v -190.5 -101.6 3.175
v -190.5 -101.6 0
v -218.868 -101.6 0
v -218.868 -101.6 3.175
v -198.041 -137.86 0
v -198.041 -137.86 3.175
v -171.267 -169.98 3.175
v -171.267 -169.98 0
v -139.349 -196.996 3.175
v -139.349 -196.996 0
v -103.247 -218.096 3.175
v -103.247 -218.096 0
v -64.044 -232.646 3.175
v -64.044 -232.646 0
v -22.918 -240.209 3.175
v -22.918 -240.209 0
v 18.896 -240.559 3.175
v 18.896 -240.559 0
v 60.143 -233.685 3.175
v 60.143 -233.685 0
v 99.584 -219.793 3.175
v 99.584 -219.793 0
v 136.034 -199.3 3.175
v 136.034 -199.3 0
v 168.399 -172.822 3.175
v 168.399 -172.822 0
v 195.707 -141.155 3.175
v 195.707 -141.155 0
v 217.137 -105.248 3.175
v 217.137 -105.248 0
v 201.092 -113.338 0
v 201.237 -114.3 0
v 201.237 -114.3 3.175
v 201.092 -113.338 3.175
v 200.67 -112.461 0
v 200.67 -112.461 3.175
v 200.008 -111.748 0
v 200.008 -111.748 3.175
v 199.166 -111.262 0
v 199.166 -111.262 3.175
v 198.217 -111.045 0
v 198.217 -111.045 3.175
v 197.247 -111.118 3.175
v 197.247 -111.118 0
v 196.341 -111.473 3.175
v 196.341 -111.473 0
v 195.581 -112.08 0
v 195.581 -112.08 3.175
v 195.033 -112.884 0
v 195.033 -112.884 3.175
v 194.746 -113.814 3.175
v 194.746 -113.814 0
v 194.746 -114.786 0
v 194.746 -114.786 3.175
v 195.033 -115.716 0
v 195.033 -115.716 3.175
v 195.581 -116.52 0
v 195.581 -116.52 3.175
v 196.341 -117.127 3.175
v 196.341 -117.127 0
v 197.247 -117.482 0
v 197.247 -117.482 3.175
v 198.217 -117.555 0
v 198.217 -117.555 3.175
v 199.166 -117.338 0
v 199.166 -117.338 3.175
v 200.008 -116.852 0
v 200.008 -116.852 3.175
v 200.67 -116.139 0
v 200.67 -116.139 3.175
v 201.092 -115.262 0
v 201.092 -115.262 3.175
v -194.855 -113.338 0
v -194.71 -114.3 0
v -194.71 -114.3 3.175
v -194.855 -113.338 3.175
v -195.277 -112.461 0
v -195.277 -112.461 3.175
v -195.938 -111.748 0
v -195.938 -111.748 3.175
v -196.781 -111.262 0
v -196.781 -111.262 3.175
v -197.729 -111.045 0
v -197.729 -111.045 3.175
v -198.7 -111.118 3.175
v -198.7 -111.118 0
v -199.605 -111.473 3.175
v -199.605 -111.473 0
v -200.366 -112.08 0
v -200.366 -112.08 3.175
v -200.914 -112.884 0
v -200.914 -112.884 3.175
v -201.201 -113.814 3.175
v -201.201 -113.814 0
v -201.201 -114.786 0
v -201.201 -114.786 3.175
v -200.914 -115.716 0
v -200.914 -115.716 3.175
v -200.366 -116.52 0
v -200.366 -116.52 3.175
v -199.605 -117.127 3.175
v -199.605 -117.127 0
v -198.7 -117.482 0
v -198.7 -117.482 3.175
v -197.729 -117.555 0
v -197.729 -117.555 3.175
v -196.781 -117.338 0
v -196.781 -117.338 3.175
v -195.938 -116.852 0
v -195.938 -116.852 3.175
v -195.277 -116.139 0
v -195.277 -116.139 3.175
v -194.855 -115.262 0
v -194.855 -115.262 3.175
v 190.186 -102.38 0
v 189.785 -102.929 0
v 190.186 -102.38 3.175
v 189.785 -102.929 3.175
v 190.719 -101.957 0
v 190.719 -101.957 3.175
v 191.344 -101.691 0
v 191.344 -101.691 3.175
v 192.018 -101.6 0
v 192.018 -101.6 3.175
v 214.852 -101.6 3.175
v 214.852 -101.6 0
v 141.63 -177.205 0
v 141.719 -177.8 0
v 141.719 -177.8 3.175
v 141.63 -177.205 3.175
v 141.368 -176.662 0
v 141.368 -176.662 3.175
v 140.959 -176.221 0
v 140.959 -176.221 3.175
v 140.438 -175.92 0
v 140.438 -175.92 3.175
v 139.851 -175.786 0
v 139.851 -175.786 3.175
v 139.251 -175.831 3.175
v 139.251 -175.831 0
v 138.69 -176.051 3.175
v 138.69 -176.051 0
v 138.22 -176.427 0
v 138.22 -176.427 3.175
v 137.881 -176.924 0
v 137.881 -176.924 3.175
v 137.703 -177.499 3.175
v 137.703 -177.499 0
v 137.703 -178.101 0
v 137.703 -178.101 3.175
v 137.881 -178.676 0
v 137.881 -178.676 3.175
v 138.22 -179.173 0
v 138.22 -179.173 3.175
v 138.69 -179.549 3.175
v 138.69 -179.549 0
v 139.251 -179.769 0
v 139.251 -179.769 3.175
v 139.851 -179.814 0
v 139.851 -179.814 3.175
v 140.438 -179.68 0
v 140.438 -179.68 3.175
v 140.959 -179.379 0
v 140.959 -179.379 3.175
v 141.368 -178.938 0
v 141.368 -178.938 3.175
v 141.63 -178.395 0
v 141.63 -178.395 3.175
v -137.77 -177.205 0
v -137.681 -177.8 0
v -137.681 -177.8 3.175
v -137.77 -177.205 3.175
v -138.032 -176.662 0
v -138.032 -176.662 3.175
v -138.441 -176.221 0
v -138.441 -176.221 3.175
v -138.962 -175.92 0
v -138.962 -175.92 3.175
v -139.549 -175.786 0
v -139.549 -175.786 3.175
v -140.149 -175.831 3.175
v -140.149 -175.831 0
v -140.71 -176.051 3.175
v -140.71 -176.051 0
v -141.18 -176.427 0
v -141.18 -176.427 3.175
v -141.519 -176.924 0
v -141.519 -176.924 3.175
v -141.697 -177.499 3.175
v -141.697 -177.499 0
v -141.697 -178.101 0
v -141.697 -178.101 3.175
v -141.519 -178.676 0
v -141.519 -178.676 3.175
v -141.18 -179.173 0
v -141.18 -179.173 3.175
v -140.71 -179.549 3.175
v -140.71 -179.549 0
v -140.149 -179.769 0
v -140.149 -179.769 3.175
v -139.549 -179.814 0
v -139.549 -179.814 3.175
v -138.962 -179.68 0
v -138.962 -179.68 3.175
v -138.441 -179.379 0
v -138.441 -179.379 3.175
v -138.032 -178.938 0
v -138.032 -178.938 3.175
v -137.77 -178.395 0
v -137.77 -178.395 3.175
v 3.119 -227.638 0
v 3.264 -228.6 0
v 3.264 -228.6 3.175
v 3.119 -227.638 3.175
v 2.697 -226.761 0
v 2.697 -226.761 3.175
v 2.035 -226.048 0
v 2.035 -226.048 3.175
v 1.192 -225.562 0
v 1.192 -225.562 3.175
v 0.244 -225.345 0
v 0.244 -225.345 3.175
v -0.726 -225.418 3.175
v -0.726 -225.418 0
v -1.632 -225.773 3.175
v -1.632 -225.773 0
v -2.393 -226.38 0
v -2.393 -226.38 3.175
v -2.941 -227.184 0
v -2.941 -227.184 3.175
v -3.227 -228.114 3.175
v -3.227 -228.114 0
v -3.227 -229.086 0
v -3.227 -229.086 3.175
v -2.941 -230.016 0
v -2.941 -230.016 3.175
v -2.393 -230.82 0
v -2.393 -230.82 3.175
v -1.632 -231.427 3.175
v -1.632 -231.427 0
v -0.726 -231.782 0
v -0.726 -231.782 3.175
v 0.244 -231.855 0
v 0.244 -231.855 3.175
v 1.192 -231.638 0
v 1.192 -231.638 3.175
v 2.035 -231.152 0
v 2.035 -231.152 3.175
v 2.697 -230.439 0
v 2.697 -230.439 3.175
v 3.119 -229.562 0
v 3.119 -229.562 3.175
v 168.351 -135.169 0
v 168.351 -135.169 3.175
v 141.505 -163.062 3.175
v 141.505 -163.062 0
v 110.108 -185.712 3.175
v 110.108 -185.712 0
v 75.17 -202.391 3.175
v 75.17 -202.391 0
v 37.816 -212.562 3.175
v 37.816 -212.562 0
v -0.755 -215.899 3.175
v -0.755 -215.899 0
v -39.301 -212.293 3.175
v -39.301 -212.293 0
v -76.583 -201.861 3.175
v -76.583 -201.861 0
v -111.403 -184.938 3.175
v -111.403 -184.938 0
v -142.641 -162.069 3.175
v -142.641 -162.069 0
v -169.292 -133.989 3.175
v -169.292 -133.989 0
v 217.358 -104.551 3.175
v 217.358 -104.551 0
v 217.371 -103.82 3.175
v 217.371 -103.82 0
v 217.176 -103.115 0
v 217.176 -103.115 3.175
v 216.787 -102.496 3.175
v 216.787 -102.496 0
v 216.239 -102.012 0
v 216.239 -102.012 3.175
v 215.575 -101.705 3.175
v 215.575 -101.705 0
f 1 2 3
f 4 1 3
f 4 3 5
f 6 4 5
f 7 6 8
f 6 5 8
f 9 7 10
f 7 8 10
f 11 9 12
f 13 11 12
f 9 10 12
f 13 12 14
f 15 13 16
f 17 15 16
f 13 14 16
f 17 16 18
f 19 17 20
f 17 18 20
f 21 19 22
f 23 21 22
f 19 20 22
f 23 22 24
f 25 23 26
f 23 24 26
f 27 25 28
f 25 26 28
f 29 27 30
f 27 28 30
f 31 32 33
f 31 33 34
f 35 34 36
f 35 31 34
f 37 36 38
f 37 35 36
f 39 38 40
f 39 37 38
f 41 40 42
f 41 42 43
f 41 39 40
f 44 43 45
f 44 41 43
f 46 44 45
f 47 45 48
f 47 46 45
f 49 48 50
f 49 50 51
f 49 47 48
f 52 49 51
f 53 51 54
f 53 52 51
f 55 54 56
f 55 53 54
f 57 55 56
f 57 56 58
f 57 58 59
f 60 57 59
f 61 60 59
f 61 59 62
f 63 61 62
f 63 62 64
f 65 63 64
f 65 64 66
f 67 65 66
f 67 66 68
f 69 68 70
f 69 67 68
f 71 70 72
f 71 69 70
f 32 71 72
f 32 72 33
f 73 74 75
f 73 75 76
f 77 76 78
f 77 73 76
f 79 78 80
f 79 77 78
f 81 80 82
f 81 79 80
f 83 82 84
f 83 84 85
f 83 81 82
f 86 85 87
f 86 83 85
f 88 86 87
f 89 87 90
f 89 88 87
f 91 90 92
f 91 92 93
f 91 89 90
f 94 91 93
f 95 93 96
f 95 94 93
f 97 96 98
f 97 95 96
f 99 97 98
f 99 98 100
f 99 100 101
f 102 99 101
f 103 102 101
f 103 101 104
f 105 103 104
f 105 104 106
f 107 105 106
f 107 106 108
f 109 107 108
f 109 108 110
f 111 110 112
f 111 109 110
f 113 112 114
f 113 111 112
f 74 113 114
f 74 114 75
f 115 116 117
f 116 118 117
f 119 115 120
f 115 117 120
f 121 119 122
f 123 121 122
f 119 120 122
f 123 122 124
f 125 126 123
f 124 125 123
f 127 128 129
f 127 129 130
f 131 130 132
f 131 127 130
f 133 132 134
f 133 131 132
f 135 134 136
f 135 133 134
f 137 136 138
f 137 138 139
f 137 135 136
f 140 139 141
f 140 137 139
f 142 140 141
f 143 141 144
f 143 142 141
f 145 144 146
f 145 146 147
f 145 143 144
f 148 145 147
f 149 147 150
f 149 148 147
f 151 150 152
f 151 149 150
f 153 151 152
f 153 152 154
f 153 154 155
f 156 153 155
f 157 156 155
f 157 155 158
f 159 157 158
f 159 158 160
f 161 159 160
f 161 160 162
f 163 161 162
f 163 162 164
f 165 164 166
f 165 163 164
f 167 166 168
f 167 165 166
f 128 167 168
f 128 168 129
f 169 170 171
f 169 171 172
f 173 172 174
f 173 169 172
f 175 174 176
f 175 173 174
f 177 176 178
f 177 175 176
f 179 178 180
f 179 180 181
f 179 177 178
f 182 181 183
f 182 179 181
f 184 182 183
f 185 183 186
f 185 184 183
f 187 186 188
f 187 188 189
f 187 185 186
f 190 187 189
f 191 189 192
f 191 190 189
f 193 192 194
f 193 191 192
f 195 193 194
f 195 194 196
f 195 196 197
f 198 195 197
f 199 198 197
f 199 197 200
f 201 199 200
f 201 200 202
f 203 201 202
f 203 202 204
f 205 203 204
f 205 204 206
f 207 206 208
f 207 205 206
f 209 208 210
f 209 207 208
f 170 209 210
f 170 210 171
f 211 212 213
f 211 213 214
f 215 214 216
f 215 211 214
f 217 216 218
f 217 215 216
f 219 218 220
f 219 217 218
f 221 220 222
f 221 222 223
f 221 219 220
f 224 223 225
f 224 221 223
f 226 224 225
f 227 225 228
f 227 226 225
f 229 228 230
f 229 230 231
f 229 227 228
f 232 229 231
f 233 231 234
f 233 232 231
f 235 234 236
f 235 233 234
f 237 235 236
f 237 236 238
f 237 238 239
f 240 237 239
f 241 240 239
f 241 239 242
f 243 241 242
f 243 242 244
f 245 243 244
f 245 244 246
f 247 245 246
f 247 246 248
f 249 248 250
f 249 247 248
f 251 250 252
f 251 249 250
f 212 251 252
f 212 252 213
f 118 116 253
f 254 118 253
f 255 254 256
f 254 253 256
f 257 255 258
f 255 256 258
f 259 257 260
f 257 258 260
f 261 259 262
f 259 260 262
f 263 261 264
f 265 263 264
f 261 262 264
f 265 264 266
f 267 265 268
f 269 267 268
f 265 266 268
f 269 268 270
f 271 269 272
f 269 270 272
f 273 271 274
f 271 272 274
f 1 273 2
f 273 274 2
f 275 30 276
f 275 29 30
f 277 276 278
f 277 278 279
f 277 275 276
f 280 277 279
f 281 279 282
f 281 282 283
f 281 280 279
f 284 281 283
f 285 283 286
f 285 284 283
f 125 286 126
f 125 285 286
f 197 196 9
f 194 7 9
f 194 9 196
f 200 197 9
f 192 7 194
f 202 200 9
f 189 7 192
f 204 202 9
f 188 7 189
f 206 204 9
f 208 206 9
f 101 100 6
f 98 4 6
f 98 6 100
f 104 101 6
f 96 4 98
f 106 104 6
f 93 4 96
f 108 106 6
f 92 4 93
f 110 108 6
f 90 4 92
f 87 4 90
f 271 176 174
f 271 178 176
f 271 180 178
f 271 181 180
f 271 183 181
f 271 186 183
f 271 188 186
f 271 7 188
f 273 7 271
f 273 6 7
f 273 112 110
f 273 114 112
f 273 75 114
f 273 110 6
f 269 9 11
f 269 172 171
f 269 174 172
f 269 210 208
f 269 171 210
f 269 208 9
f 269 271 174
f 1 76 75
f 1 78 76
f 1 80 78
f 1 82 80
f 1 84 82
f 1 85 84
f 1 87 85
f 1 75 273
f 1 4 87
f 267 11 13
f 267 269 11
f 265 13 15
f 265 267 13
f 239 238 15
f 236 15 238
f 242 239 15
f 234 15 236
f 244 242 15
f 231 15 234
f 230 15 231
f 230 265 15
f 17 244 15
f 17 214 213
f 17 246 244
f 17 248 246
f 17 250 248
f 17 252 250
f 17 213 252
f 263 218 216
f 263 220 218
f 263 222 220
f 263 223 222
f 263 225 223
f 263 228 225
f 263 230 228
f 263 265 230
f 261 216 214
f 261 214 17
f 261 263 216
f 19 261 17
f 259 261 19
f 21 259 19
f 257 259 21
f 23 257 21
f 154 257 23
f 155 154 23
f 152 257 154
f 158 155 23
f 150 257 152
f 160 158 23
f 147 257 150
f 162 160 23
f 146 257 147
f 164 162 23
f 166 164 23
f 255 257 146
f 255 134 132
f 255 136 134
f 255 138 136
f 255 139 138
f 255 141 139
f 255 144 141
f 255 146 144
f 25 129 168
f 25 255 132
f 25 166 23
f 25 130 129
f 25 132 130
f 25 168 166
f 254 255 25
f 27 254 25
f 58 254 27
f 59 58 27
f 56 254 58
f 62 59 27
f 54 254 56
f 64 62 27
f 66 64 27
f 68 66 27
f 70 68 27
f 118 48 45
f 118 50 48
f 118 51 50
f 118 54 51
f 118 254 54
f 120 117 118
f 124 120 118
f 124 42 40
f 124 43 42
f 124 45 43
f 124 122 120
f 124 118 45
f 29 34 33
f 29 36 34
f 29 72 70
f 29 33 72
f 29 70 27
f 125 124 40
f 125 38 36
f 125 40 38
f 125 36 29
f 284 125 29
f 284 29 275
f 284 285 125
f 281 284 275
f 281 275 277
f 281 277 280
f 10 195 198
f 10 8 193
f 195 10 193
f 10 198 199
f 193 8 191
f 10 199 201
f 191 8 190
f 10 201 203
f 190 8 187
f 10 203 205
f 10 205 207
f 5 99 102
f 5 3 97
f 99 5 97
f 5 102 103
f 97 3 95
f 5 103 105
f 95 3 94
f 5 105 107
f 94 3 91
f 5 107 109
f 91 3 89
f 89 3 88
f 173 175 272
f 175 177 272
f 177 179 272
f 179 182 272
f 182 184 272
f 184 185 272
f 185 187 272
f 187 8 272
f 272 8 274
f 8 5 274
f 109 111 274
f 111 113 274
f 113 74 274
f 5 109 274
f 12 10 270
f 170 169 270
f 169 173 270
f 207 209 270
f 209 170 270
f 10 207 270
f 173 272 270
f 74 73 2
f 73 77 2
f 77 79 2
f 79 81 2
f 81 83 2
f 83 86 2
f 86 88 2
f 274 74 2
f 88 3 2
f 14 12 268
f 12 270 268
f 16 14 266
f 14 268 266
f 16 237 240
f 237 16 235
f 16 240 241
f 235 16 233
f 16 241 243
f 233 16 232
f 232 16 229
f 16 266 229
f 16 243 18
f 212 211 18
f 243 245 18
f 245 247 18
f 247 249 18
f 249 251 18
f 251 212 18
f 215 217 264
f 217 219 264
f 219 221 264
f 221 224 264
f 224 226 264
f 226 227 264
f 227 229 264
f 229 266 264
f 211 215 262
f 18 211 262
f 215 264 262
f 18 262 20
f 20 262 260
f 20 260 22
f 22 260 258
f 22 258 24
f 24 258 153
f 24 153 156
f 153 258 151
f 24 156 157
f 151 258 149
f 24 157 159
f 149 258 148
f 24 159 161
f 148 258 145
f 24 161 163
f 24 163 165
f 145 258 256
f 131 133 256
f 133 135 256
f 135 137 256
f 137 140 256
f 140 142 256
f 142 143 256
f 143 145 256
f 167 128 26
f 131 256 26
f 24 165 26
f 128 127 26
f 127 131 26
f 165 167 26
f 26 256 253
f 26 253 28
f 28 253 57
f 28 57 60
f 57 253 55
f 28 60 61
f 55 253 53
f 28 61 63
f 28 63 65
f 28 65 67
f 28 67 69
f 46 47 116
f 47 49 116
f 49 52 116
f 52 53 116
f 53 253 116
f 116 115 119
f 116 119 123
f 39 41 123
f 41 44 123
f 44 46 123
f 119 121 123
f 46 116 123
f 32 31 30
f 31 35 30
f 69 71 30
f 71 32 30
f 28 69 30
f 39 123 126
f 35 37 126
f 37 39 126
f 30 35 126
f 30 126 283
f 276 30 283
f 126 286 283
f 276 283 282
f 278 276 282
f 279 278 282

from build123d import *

# Parameters (mm, degrees)
SKETCH1_R           = 2.0193
SKETCH1_R_2         = 3.2639
BOSS_EXTRUDE1_DEPTH = 3.175
FILLET1_R           = 2.54


with BuildPart() as part:
    # Sketch1 → Boss-Extrude1 (new body)
    with BuildSketch(Plane.XY):
        with BuildLine():
            Line((-190.5, -101.6), (-218.867836833, -101.6))
            ThreePointArc((-218.867836833, -101.6), (0, -241.3), (218.867836833, -101.6))
            Line((218.867836833, -101.6), (190.5, -101.6))
            ThreePointArc((190.5, -101.6), (0, -215.9), (-190.5, -101.6))
        make_face()
        with Locations((-139.7, -177.8)):
            Circle(SKETCH1_R, mode=Mode.SUBTRACT)
        with Locations((-197.973407305, -114.3)):
            Circle(SKETCH1_R_2, mode=Mode.SUBTRACT)
        with Locations((0, -228.6)):
            Circle(SKETCH1_R_2, mode=Mode.SUBTRACT)
        with Locations((139.7, -177.8)):
            Circle(SKETCH1_R, mode=Mode.SUBTRACT)
        with Locations((197.973407305, -114.3)):
            Circle(SKETCH1_R_2, mode=Mode.SUBTRACT)
    extrude(amount=BOSS_EXTRUDE1_DEPTH)

    # Fillet1
    fillet1_edges = [part.edges().sort_by_distance(p)[0] for p in [
        (190.5, -101.6, 1.5875),
        (218.867836833, -101.6, 1.5875),
    ]]
    fillet(fillet1_edges, radius=FILLET1_R)


solid = part.part
